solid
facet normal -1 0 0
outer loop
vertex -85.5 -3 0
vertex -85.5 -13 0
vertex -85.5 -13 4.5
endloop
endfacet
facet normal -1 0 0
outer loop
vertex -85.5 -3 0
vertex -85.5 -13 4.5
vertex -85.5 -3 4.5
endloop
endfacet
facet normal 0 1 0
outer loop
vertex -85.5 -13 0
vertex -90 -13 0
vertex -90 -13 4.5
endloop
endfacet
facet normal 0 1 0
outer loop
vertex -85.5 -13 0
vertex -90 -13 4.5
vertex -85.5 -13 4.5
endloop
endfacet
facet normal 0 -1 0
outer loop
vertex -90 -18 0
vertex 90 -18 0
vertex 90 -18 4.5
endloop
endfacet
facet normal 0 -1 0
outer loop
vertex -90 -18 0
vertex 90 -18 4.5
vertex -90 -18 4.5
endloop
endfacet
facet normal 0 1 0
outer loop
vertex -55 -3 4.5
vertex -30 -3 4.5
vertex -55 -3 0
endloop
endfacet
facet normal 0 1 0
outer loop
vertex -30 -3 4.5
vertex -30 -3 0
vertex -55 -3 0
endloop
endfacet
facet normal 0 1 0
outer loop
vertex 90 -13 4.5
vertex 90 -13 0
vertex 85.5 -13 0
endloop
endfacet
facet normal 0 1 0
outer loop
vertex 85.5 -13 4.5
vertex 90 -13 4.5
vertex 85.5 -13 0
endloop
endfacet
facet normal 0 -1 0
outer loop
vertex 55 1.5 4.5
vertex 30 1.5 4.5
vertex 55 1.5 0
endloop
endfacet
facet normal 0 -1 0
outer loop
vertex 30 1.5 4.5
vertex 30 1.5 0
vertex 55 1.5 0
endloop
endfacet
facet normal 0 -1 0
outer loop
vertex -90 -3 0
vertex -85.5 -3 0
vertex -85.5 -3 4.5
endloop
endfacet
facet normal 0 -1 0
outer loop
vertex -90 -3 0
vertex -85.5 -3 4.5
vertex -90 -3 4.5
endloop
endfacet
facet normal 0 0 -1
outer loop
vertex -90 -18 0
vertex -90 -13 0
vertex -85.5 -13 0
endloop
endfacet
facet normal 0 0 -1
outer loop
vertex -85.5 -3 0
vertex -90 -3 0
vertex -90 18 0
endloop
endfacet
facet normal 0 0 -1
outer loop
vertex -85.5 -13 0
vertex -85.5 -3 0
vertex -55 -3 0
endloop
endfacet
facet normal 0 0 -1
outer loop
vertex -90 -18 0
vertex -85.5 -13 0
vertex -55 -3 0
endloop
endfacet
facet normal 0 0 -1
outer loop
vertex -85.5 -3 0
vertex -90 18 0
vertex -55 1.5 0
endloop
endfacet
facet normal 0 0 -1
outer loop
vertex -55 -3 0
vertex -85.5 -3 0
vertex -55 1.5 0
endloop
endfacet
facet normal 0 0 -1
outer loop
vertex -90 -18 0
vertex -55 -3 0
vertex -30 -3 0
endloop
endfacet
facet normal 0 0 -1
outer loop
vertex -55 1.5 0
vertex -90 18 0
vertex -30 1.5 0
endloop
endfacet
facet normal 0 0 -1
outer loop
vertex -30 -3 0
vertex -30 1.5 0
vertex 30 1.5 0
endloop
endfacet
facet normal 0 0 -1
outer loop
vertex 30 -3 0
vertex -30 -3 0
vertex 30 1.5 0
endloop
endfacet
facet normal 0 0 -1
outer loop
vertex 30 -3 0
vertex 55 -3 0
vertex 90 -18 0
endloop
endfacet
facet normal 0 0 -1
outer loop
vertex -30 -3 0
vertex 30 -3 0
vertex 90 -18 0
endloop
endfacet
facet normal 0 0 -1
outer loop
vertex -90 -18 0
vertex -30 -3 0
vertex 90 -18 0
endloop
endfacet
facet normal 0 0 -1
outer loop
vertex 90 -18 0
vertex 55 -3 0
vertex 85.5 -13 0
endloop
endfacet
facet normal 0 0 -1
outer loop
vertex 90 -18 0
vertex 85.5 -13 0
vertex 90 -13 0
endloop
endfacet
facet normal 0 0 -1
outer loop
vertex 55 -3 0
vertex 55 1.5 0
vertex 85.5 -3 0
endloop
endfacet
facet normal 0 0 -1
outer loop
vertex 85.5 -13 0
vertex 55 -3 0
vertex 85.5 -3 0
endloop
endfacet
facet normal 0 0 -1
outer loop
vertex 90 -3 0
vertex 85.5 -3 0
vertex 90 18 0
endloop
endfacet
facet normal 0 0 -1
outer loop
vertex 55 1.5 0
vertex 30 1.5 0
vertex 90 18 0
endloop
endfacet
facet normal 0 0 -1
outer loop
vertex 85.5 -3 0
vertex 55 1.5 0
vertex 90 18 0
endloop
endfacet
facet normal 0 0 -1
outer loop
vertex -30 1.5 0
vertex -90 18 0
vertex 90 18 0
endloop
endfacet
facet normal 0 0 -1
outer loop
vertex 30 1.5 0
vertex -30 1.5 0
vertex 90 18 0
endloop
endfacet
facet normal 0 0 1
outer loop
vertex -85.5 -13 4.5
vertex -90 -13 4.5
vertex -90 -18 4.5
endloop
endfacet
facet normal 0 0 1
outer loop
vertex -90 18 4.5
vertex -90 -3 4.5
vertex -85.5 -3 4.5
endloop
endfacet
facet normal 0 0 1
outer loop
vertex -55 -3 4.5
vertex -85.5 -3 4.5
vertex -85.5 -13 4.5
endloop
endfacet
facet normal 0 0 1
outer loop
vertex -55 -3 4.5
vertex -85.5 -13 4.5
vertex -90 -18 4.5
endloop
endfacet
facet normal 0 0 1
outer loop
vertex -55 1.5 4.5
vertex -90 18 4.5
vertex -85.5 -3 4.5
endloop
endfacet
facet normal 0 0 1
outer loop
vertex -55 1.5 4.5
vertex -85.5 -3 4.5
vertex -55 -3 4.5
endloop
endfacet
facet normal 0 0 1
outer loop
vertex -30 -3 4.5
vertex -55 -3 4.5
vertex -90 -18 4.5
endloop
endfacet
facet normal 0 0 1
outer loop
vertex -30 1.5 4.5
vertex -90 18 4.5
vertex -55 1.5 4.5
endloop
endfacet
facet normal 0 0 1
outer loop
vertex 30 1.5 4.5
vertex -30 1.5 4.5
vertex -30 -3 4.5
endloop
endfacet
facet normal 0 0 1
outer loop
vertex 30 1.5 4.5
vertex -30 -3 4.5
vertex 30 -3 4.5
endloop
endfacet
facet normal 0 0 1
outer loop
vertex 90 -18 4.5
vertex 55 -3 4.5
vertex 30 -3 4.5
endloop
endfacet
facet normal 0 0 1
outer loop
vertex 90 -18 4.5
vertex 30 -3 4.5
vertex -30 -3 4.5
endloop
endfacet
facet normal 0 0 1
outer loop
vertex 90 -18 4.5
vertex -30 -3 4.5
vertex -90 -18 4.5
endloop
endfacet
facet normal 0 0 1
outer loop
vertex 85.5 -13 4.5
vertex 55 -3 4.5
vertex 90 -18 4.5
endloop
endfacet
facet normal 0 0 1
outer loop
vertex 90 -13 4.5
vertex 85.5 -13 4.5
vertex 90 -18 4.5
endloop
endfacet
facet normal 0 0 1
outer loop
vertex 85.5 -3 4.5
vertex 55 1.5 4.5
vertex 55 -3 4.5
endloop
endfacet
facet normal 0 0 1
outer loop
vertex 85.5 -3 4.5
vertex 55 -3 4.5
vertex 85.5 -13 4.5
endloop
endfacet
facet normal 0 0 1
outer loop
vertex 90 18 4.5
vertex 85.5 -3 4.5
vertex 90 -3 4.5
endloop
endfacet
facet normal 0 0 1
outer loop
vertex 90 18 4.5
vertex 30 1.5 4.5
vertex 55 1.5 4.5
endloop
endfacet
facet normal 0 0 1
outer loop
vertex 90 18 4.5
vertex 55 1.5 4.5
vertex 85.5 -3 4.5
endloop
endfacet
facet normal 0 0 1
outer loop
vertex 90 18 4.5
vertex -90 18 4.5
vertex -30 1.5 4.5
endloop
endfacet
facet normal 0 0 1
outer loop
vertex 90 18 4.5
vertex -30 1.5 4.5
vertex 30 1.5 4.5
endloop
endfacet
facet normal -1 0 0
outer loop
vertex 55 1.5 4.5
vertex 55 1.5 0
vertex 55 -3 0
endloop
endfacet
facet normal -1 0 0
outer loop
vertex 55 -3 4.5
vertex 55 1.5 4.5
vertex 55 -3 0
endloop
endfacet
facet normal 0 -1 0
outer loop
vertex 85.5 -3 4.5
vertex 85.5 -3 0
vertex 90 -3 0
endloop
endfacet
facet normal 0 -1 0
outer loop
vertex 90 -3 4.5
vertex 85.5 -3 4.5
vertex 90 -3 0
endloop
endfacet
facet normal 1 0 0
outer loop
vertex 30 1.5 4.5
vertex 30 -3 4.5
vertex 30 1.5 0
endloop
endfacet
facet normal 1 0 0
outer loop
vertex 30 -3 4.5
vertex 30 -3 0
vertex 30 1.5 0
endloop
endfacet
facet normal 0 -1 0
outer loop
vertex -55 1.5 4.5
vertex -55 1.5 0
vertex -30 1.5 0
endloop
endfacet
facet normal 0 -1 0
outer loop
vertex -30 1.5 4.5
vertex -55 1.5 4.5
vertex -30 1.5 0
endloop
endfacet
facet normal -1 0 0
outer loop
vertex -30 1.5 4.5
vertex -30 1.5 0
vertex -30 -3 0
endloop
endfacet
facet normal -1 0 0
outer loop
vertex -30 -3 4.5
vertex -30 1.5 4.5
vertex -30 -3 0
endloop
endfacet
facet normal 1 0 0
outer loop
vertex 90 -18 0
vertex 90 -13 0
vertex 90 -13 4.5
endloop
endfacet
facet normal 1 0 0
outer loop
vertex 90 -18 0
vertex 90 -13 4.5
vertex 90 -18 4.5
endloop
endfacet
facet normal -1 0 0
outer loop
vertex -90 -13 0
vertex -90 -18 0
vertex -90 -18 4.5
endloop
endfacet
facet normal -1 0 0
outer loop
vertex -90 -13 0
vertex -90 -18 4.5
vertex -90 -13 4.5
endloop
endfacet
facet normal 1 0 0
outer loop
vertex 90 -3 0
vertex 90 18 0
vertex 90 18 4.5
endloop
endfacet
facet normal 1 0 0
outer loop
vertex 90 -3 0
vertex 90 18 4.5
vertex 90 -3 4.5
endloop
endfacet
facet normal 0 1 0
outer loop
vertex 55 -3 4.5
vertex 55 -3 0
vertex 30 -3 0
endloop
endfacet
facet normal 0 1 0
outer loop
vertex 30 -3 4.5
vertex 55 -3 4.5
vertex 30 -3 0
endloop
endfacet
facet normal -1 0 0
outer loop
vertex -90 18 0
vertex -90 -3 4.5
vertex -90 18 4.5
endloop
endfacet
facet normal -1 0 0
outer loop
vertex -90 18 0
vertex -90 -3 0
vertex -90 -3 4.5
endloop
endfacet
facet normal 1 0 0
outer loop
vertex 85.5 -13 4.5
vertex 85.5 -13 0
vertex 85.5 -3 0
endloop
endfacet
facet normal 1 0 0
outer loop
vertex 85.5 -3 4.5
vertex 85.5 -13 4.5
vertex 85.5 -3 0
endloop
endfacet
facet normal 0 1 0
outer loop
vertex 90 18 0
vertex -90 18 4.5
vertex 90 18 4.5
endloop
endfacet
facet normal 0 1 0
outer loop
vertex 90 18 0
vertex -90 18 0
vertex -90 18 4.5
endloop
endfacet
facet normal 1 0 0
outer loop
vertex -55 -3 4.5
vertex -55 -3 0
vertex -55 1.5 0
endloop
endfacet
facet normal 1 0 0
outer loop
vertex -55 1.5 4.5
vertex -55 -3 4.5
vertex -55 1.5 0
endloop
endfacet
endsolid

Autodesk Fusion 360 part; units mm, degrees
sketch "Sketch1" plane through (0, 0, 0) normal (0, 0, 1) x (1, 0, 0)
  line L0 (90, -18) -> (-90, -18)
  line L1 (-90, -18) -> (-90, 18)
  line L2 (-90, 18) -> (90, 18)
  line L3 (90, 18) -> (90, -18)
  line L4 (90, -18) -> (-90, 18) construction
  line L5 (-90, -18) -> (90, 18) construction
  line L6 (90, -13) -> (85.5, -13)
  line L7 (85.5, -13) -> (85.5, -3)
  line L8 (85.5, -3) -> (90, -3)
  line L9 (90, -3) -> (90, -13)
  line L10 (-90, -13) -> (-85.5, -13)
  line L11 (-85.5, -13) -> (-85.5, -3)
  line L12 (-85.5, -3) -> (-90, -3)
  line L13 (-90, -3) -> (-90, -13)
  line L14 (-98.0215, -0.75) -> (96.9785, -0.75) construction
  line L15 (55, -3) -> (30, -3)
  line L16 (30, -3) -> (30, 1.5)
  line L17 (30, 1.5) -> (55, 1.5)
  line L18 (55, 1.5) -> (55, -3)
  line L19 (55, -3) -> (30, 1.5) construction
  line L20 (30, -3) -> (55, 1.5) construction
  line L21 (-30, -3) -> (-55, -3)
  line L22 (-55, -3) -> (-55, 1.5)
  line L23 (-55, 1.5) -> (-30, 1.5)
  line L24 (-30, 1.5) -> (-30, -3)
  line L25 (-30, -3) -> (-55, 1.5) construction
  line L26 (-55, -3) -> (-30, 1.5) construction
  point P0 (42.5, -0.75)
  point P1 (-42.5, -0.75)
  dimension "d1" = 180
  dimension "d2" = 36
  dimension "d3" = 4.5
  dimension "d4" = 10
  dimension "d5" = 4.5
  dimension "d6" = 10
  dimension "d7" = 5
  dimension "d8" = 5
  dimension "d9" = 17.25
  dimension "d10" = 25
  dimension "d11" = 4.5
  dimension "d12" = 25
  dimension "d13" = 4.5
  dimension "d14" = 35
  dimension "d15" = 35
extrude "Extrude1" add sketch "Sketch1" along normal blind 4.5 contours L0 L1 L2 L3 L6 L7 L8 L10 L11 L12
